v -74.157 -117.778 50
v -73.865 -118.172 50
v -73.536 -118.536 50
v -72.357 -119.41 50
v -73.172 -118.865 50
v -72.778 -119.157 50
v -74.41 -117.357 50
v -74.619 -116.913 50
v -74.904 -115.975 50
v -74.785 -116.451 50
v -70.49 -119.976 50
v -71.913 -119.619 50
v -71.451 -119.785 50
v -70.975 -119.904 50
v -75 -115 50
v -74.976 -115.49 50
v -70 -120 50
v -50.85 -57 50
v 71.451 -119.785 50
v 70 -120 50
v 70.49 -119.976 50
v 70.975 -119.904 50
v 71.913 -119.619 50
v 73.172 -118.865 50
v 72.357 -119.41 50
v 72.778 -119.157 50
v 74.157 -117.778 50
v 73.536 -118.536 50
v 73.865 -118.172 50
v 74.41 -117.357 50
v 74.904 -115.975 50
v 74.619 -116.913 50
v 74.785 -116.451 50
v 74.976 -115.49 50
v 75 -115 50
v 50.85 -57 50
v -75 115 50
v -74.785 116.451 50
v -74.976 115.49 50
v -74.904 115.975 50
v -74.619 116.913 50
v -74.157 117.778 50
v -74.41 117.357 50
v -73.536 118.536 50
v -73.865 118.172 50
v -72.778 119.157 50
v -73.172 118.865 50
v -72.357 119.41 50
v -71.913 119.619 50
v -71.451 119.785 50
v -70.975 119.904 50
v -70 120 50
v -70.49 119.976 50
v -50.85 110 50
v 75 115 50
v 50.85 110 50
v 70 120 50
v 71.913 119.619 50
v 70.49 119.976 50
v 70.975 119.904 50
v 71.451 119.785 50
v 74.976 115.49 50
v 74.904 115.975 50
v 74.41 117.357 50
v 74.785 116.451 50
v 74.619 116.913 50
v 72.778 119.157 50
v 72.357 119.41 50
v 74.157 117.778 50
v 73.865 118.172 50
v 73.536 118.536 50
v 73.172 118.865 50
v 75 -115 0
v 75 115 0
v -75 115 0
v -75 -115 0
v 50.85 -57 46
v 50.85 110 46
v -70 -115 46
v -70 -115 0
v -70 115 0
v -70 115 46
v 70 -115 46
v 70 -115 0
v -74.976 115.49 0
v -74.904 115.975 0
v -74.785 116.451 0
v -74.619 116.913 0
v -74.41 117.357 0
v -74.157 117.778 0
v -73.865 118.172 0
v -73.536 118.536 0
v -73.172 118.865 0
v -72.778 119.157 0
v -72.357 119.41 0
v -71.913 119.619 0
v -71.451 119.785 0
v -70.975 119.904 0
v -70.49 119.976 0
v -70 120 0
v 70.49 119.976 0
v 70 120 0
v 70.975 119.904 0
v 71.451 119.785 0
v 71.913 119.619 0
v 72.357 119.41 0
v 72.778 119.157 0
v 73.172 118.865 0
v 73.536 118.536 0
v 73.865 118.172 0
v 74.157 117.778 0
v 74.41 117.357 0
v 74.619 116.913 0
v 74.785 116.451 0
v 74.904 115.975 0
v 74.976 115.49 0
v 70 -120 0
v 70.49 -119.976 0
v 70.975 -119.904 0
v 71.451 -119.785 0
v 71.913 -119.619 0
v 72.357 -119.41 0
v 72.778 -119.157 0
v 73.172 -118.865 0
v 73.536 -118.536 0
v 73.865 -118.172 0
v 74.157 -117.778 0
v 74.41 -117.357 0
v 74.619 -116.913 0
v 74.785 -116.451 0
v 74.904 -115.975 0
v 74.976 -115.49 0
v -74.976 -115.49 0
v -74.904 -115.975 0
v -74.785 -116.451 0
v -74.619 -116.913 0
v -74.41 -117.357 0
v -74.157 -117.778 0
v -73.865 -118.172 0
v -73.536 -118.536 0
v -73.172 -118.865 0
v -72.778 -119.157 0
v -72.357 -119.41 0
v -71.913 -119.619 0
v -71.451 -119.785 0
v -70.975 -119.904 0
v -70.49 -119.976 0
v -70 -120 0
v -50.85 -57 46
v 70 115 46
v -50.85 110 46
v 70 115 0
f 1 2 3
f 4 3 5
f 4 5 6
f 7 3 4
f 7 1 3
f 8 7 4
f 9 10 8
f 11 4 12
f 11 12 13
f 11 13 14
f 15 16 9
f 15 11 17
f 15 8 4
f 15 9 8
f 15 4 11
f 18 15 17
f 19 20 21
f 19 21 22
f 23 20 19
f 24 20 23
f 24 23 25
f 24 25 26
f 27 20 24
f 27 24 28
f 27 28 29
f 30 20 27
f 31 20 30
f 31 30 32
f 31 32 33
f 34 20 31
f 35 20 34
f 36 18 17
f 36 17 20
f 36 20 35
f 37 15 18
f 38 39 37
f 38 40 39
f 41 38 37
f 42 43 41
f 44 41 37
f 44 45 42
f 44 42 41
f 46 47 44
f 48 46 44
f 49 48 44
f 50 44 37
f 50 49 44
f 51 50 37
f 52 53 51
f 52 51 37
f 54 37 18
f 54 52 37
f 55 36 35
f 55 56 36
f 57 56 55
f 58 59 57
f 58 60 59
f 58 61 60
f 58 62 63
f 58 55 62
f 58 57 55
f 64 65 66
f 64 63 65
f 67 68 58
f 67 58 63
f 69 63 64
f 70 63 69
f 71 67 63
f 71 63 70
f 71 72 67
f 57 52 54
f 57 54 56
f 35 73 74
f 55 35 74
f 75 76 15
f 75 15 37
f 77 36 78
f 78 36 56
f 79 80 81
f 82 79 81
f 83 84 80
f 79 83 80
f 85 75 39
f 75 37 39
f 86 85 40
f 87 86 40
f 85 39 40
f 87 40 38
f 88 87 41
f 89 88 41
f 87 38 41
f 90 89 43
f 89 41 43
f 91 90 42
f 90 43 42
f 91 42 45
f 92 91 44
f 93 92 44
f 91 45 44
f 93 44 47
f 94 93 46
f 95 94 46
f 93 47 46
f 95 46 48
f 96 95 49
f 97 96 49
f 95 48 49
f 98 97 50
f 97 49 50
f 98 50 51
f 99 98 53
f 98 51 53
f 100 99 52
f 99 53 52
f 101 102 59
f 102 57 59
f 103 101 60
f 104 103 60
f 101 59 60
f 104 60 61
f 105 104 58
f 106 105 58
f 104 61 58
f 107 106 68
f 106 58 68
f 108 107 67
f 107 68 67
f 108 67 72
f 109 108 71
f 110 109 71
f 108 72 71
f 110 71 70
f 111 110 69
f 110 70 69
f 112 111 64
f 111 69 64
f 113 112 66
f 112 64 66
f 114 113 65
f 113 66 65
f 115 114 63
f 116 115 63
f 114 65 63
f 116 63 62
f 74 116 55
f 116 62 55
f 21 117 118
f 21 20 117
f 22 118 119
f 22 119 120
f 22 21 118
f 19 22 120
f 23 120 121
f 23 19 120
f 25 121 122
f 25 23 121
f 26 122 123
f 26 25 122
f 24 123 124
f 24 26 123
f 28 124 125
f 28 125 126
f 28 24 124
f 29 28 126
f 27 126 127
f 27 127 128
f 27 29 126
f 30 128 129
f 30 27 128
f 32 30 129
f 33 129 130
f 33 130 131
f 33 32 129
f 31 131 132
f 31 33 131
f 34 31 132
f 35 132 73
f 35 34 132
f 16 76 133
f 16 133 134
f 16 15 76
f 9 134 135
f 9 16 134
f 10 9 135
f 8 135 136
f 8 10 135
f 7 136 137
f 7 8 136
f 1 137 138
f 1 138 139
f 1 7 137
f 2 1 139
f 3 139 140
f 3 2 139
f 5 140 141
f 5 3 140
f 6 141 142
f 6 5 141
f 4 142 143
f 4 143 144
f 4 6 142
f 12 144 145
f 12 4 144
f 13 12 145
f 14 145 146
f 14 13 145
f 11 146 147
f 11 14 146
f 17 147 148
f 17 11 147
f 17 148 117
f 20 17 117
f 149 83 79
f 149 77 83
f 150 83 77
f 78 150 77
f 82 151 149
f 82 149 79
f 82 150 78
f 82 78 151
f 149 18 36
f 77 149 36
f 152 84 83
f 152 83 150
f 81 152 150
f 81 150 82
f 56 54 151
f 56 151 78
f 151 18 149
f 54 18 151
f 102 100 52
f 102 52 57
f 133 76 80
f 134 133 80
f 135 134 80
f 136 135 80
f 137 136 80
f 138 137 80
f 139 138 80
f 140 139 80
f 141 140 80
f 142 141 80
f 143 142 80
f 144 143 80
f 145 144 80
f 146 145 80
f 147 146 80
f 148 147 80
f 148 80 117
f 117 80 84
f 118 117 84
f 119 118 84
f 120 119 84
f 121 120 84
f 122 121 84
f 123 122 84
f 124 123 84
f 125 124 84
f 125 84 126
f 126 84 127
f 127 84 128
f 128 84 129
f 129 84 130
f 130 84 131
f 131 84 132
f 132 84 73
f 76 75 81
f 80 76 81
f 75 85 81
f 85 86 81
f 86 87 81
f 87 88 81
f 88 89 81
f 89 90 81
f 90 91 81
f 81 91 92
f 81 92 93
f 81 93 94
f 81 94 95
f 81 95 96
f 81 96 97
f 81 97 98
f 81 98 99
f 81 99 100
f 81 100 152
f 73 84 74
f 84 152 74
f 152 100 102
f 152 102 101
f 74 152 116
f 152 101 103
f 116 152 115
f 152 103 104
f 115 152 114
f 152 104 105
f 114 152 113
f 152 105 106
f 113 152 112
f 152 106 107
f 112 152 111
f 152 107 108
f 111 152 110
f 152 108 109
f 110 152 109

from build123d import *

# Parameters (mm, degrees)
ESQUISSE1_W             = 150
ESQUISSE1_H             = 240
BOSS_EXTRU_1_DEPTH      = 50
ESQUISSE2_W             = 140
ESQUISSE2_H             = 230
ENL_V_MAT_EXTRU_1_DEPTH = 46
ESQUISSE3_W             = 101.7
ESQUISSE3_H             = 167
ENL_V_MAT_EXTRU_2_DEPTH = 151.083310198
CONG_1_R                = 5


with BuildPart() as part:
    # Esquisse1 → Boss.-Extru.1 (new body)
    with BuildSketch(Plane.XY):
        Rectangle(ESQUISSE1_W, ESQUISSE1_H)
    extrude(amount=BOSS_EXTRU_1_DEPTH)

    # Esquisse2 → Enlèv. mat.-Extru.1 (cut)
    with BuildSketch(Plane(origin=(0, 0, 0), x_dir=(-1, 0, 0), z_dir=(0, 0, -1))):
        Rectangle(ESQUISSE2_W, ESQUISSE2_H)
    extrude(amount=-ENL_V_MAT_EXTRU_1_DEPTH, mode=Mode.SUBTRACT)

    # Esquisse3 → Enlèv. mat.-Extru.2 (cut, through all)
    with BuildSketch(Plane.XY.offset(50)):
        with Locations((0, 26.5)):
            Rectangle(ESQUISSE3_W, ESQUISSE3_H)
    extrude(amount=-ENL_V_MAT_EXTRU_2_DEPTH, mode=Mode.SUBTRACT)

    # Congé1
    cong_1_edges = [part.edges().sort_by_distance(p)[0] for p in [
        (-75, 120, 25),
        (75, 120, 25),
        (75, -120, 25),
        (-75, -120, 25),
    ]]
    fillet(cong_1_edges, radius=CONG_1_R)


solid = part.part
